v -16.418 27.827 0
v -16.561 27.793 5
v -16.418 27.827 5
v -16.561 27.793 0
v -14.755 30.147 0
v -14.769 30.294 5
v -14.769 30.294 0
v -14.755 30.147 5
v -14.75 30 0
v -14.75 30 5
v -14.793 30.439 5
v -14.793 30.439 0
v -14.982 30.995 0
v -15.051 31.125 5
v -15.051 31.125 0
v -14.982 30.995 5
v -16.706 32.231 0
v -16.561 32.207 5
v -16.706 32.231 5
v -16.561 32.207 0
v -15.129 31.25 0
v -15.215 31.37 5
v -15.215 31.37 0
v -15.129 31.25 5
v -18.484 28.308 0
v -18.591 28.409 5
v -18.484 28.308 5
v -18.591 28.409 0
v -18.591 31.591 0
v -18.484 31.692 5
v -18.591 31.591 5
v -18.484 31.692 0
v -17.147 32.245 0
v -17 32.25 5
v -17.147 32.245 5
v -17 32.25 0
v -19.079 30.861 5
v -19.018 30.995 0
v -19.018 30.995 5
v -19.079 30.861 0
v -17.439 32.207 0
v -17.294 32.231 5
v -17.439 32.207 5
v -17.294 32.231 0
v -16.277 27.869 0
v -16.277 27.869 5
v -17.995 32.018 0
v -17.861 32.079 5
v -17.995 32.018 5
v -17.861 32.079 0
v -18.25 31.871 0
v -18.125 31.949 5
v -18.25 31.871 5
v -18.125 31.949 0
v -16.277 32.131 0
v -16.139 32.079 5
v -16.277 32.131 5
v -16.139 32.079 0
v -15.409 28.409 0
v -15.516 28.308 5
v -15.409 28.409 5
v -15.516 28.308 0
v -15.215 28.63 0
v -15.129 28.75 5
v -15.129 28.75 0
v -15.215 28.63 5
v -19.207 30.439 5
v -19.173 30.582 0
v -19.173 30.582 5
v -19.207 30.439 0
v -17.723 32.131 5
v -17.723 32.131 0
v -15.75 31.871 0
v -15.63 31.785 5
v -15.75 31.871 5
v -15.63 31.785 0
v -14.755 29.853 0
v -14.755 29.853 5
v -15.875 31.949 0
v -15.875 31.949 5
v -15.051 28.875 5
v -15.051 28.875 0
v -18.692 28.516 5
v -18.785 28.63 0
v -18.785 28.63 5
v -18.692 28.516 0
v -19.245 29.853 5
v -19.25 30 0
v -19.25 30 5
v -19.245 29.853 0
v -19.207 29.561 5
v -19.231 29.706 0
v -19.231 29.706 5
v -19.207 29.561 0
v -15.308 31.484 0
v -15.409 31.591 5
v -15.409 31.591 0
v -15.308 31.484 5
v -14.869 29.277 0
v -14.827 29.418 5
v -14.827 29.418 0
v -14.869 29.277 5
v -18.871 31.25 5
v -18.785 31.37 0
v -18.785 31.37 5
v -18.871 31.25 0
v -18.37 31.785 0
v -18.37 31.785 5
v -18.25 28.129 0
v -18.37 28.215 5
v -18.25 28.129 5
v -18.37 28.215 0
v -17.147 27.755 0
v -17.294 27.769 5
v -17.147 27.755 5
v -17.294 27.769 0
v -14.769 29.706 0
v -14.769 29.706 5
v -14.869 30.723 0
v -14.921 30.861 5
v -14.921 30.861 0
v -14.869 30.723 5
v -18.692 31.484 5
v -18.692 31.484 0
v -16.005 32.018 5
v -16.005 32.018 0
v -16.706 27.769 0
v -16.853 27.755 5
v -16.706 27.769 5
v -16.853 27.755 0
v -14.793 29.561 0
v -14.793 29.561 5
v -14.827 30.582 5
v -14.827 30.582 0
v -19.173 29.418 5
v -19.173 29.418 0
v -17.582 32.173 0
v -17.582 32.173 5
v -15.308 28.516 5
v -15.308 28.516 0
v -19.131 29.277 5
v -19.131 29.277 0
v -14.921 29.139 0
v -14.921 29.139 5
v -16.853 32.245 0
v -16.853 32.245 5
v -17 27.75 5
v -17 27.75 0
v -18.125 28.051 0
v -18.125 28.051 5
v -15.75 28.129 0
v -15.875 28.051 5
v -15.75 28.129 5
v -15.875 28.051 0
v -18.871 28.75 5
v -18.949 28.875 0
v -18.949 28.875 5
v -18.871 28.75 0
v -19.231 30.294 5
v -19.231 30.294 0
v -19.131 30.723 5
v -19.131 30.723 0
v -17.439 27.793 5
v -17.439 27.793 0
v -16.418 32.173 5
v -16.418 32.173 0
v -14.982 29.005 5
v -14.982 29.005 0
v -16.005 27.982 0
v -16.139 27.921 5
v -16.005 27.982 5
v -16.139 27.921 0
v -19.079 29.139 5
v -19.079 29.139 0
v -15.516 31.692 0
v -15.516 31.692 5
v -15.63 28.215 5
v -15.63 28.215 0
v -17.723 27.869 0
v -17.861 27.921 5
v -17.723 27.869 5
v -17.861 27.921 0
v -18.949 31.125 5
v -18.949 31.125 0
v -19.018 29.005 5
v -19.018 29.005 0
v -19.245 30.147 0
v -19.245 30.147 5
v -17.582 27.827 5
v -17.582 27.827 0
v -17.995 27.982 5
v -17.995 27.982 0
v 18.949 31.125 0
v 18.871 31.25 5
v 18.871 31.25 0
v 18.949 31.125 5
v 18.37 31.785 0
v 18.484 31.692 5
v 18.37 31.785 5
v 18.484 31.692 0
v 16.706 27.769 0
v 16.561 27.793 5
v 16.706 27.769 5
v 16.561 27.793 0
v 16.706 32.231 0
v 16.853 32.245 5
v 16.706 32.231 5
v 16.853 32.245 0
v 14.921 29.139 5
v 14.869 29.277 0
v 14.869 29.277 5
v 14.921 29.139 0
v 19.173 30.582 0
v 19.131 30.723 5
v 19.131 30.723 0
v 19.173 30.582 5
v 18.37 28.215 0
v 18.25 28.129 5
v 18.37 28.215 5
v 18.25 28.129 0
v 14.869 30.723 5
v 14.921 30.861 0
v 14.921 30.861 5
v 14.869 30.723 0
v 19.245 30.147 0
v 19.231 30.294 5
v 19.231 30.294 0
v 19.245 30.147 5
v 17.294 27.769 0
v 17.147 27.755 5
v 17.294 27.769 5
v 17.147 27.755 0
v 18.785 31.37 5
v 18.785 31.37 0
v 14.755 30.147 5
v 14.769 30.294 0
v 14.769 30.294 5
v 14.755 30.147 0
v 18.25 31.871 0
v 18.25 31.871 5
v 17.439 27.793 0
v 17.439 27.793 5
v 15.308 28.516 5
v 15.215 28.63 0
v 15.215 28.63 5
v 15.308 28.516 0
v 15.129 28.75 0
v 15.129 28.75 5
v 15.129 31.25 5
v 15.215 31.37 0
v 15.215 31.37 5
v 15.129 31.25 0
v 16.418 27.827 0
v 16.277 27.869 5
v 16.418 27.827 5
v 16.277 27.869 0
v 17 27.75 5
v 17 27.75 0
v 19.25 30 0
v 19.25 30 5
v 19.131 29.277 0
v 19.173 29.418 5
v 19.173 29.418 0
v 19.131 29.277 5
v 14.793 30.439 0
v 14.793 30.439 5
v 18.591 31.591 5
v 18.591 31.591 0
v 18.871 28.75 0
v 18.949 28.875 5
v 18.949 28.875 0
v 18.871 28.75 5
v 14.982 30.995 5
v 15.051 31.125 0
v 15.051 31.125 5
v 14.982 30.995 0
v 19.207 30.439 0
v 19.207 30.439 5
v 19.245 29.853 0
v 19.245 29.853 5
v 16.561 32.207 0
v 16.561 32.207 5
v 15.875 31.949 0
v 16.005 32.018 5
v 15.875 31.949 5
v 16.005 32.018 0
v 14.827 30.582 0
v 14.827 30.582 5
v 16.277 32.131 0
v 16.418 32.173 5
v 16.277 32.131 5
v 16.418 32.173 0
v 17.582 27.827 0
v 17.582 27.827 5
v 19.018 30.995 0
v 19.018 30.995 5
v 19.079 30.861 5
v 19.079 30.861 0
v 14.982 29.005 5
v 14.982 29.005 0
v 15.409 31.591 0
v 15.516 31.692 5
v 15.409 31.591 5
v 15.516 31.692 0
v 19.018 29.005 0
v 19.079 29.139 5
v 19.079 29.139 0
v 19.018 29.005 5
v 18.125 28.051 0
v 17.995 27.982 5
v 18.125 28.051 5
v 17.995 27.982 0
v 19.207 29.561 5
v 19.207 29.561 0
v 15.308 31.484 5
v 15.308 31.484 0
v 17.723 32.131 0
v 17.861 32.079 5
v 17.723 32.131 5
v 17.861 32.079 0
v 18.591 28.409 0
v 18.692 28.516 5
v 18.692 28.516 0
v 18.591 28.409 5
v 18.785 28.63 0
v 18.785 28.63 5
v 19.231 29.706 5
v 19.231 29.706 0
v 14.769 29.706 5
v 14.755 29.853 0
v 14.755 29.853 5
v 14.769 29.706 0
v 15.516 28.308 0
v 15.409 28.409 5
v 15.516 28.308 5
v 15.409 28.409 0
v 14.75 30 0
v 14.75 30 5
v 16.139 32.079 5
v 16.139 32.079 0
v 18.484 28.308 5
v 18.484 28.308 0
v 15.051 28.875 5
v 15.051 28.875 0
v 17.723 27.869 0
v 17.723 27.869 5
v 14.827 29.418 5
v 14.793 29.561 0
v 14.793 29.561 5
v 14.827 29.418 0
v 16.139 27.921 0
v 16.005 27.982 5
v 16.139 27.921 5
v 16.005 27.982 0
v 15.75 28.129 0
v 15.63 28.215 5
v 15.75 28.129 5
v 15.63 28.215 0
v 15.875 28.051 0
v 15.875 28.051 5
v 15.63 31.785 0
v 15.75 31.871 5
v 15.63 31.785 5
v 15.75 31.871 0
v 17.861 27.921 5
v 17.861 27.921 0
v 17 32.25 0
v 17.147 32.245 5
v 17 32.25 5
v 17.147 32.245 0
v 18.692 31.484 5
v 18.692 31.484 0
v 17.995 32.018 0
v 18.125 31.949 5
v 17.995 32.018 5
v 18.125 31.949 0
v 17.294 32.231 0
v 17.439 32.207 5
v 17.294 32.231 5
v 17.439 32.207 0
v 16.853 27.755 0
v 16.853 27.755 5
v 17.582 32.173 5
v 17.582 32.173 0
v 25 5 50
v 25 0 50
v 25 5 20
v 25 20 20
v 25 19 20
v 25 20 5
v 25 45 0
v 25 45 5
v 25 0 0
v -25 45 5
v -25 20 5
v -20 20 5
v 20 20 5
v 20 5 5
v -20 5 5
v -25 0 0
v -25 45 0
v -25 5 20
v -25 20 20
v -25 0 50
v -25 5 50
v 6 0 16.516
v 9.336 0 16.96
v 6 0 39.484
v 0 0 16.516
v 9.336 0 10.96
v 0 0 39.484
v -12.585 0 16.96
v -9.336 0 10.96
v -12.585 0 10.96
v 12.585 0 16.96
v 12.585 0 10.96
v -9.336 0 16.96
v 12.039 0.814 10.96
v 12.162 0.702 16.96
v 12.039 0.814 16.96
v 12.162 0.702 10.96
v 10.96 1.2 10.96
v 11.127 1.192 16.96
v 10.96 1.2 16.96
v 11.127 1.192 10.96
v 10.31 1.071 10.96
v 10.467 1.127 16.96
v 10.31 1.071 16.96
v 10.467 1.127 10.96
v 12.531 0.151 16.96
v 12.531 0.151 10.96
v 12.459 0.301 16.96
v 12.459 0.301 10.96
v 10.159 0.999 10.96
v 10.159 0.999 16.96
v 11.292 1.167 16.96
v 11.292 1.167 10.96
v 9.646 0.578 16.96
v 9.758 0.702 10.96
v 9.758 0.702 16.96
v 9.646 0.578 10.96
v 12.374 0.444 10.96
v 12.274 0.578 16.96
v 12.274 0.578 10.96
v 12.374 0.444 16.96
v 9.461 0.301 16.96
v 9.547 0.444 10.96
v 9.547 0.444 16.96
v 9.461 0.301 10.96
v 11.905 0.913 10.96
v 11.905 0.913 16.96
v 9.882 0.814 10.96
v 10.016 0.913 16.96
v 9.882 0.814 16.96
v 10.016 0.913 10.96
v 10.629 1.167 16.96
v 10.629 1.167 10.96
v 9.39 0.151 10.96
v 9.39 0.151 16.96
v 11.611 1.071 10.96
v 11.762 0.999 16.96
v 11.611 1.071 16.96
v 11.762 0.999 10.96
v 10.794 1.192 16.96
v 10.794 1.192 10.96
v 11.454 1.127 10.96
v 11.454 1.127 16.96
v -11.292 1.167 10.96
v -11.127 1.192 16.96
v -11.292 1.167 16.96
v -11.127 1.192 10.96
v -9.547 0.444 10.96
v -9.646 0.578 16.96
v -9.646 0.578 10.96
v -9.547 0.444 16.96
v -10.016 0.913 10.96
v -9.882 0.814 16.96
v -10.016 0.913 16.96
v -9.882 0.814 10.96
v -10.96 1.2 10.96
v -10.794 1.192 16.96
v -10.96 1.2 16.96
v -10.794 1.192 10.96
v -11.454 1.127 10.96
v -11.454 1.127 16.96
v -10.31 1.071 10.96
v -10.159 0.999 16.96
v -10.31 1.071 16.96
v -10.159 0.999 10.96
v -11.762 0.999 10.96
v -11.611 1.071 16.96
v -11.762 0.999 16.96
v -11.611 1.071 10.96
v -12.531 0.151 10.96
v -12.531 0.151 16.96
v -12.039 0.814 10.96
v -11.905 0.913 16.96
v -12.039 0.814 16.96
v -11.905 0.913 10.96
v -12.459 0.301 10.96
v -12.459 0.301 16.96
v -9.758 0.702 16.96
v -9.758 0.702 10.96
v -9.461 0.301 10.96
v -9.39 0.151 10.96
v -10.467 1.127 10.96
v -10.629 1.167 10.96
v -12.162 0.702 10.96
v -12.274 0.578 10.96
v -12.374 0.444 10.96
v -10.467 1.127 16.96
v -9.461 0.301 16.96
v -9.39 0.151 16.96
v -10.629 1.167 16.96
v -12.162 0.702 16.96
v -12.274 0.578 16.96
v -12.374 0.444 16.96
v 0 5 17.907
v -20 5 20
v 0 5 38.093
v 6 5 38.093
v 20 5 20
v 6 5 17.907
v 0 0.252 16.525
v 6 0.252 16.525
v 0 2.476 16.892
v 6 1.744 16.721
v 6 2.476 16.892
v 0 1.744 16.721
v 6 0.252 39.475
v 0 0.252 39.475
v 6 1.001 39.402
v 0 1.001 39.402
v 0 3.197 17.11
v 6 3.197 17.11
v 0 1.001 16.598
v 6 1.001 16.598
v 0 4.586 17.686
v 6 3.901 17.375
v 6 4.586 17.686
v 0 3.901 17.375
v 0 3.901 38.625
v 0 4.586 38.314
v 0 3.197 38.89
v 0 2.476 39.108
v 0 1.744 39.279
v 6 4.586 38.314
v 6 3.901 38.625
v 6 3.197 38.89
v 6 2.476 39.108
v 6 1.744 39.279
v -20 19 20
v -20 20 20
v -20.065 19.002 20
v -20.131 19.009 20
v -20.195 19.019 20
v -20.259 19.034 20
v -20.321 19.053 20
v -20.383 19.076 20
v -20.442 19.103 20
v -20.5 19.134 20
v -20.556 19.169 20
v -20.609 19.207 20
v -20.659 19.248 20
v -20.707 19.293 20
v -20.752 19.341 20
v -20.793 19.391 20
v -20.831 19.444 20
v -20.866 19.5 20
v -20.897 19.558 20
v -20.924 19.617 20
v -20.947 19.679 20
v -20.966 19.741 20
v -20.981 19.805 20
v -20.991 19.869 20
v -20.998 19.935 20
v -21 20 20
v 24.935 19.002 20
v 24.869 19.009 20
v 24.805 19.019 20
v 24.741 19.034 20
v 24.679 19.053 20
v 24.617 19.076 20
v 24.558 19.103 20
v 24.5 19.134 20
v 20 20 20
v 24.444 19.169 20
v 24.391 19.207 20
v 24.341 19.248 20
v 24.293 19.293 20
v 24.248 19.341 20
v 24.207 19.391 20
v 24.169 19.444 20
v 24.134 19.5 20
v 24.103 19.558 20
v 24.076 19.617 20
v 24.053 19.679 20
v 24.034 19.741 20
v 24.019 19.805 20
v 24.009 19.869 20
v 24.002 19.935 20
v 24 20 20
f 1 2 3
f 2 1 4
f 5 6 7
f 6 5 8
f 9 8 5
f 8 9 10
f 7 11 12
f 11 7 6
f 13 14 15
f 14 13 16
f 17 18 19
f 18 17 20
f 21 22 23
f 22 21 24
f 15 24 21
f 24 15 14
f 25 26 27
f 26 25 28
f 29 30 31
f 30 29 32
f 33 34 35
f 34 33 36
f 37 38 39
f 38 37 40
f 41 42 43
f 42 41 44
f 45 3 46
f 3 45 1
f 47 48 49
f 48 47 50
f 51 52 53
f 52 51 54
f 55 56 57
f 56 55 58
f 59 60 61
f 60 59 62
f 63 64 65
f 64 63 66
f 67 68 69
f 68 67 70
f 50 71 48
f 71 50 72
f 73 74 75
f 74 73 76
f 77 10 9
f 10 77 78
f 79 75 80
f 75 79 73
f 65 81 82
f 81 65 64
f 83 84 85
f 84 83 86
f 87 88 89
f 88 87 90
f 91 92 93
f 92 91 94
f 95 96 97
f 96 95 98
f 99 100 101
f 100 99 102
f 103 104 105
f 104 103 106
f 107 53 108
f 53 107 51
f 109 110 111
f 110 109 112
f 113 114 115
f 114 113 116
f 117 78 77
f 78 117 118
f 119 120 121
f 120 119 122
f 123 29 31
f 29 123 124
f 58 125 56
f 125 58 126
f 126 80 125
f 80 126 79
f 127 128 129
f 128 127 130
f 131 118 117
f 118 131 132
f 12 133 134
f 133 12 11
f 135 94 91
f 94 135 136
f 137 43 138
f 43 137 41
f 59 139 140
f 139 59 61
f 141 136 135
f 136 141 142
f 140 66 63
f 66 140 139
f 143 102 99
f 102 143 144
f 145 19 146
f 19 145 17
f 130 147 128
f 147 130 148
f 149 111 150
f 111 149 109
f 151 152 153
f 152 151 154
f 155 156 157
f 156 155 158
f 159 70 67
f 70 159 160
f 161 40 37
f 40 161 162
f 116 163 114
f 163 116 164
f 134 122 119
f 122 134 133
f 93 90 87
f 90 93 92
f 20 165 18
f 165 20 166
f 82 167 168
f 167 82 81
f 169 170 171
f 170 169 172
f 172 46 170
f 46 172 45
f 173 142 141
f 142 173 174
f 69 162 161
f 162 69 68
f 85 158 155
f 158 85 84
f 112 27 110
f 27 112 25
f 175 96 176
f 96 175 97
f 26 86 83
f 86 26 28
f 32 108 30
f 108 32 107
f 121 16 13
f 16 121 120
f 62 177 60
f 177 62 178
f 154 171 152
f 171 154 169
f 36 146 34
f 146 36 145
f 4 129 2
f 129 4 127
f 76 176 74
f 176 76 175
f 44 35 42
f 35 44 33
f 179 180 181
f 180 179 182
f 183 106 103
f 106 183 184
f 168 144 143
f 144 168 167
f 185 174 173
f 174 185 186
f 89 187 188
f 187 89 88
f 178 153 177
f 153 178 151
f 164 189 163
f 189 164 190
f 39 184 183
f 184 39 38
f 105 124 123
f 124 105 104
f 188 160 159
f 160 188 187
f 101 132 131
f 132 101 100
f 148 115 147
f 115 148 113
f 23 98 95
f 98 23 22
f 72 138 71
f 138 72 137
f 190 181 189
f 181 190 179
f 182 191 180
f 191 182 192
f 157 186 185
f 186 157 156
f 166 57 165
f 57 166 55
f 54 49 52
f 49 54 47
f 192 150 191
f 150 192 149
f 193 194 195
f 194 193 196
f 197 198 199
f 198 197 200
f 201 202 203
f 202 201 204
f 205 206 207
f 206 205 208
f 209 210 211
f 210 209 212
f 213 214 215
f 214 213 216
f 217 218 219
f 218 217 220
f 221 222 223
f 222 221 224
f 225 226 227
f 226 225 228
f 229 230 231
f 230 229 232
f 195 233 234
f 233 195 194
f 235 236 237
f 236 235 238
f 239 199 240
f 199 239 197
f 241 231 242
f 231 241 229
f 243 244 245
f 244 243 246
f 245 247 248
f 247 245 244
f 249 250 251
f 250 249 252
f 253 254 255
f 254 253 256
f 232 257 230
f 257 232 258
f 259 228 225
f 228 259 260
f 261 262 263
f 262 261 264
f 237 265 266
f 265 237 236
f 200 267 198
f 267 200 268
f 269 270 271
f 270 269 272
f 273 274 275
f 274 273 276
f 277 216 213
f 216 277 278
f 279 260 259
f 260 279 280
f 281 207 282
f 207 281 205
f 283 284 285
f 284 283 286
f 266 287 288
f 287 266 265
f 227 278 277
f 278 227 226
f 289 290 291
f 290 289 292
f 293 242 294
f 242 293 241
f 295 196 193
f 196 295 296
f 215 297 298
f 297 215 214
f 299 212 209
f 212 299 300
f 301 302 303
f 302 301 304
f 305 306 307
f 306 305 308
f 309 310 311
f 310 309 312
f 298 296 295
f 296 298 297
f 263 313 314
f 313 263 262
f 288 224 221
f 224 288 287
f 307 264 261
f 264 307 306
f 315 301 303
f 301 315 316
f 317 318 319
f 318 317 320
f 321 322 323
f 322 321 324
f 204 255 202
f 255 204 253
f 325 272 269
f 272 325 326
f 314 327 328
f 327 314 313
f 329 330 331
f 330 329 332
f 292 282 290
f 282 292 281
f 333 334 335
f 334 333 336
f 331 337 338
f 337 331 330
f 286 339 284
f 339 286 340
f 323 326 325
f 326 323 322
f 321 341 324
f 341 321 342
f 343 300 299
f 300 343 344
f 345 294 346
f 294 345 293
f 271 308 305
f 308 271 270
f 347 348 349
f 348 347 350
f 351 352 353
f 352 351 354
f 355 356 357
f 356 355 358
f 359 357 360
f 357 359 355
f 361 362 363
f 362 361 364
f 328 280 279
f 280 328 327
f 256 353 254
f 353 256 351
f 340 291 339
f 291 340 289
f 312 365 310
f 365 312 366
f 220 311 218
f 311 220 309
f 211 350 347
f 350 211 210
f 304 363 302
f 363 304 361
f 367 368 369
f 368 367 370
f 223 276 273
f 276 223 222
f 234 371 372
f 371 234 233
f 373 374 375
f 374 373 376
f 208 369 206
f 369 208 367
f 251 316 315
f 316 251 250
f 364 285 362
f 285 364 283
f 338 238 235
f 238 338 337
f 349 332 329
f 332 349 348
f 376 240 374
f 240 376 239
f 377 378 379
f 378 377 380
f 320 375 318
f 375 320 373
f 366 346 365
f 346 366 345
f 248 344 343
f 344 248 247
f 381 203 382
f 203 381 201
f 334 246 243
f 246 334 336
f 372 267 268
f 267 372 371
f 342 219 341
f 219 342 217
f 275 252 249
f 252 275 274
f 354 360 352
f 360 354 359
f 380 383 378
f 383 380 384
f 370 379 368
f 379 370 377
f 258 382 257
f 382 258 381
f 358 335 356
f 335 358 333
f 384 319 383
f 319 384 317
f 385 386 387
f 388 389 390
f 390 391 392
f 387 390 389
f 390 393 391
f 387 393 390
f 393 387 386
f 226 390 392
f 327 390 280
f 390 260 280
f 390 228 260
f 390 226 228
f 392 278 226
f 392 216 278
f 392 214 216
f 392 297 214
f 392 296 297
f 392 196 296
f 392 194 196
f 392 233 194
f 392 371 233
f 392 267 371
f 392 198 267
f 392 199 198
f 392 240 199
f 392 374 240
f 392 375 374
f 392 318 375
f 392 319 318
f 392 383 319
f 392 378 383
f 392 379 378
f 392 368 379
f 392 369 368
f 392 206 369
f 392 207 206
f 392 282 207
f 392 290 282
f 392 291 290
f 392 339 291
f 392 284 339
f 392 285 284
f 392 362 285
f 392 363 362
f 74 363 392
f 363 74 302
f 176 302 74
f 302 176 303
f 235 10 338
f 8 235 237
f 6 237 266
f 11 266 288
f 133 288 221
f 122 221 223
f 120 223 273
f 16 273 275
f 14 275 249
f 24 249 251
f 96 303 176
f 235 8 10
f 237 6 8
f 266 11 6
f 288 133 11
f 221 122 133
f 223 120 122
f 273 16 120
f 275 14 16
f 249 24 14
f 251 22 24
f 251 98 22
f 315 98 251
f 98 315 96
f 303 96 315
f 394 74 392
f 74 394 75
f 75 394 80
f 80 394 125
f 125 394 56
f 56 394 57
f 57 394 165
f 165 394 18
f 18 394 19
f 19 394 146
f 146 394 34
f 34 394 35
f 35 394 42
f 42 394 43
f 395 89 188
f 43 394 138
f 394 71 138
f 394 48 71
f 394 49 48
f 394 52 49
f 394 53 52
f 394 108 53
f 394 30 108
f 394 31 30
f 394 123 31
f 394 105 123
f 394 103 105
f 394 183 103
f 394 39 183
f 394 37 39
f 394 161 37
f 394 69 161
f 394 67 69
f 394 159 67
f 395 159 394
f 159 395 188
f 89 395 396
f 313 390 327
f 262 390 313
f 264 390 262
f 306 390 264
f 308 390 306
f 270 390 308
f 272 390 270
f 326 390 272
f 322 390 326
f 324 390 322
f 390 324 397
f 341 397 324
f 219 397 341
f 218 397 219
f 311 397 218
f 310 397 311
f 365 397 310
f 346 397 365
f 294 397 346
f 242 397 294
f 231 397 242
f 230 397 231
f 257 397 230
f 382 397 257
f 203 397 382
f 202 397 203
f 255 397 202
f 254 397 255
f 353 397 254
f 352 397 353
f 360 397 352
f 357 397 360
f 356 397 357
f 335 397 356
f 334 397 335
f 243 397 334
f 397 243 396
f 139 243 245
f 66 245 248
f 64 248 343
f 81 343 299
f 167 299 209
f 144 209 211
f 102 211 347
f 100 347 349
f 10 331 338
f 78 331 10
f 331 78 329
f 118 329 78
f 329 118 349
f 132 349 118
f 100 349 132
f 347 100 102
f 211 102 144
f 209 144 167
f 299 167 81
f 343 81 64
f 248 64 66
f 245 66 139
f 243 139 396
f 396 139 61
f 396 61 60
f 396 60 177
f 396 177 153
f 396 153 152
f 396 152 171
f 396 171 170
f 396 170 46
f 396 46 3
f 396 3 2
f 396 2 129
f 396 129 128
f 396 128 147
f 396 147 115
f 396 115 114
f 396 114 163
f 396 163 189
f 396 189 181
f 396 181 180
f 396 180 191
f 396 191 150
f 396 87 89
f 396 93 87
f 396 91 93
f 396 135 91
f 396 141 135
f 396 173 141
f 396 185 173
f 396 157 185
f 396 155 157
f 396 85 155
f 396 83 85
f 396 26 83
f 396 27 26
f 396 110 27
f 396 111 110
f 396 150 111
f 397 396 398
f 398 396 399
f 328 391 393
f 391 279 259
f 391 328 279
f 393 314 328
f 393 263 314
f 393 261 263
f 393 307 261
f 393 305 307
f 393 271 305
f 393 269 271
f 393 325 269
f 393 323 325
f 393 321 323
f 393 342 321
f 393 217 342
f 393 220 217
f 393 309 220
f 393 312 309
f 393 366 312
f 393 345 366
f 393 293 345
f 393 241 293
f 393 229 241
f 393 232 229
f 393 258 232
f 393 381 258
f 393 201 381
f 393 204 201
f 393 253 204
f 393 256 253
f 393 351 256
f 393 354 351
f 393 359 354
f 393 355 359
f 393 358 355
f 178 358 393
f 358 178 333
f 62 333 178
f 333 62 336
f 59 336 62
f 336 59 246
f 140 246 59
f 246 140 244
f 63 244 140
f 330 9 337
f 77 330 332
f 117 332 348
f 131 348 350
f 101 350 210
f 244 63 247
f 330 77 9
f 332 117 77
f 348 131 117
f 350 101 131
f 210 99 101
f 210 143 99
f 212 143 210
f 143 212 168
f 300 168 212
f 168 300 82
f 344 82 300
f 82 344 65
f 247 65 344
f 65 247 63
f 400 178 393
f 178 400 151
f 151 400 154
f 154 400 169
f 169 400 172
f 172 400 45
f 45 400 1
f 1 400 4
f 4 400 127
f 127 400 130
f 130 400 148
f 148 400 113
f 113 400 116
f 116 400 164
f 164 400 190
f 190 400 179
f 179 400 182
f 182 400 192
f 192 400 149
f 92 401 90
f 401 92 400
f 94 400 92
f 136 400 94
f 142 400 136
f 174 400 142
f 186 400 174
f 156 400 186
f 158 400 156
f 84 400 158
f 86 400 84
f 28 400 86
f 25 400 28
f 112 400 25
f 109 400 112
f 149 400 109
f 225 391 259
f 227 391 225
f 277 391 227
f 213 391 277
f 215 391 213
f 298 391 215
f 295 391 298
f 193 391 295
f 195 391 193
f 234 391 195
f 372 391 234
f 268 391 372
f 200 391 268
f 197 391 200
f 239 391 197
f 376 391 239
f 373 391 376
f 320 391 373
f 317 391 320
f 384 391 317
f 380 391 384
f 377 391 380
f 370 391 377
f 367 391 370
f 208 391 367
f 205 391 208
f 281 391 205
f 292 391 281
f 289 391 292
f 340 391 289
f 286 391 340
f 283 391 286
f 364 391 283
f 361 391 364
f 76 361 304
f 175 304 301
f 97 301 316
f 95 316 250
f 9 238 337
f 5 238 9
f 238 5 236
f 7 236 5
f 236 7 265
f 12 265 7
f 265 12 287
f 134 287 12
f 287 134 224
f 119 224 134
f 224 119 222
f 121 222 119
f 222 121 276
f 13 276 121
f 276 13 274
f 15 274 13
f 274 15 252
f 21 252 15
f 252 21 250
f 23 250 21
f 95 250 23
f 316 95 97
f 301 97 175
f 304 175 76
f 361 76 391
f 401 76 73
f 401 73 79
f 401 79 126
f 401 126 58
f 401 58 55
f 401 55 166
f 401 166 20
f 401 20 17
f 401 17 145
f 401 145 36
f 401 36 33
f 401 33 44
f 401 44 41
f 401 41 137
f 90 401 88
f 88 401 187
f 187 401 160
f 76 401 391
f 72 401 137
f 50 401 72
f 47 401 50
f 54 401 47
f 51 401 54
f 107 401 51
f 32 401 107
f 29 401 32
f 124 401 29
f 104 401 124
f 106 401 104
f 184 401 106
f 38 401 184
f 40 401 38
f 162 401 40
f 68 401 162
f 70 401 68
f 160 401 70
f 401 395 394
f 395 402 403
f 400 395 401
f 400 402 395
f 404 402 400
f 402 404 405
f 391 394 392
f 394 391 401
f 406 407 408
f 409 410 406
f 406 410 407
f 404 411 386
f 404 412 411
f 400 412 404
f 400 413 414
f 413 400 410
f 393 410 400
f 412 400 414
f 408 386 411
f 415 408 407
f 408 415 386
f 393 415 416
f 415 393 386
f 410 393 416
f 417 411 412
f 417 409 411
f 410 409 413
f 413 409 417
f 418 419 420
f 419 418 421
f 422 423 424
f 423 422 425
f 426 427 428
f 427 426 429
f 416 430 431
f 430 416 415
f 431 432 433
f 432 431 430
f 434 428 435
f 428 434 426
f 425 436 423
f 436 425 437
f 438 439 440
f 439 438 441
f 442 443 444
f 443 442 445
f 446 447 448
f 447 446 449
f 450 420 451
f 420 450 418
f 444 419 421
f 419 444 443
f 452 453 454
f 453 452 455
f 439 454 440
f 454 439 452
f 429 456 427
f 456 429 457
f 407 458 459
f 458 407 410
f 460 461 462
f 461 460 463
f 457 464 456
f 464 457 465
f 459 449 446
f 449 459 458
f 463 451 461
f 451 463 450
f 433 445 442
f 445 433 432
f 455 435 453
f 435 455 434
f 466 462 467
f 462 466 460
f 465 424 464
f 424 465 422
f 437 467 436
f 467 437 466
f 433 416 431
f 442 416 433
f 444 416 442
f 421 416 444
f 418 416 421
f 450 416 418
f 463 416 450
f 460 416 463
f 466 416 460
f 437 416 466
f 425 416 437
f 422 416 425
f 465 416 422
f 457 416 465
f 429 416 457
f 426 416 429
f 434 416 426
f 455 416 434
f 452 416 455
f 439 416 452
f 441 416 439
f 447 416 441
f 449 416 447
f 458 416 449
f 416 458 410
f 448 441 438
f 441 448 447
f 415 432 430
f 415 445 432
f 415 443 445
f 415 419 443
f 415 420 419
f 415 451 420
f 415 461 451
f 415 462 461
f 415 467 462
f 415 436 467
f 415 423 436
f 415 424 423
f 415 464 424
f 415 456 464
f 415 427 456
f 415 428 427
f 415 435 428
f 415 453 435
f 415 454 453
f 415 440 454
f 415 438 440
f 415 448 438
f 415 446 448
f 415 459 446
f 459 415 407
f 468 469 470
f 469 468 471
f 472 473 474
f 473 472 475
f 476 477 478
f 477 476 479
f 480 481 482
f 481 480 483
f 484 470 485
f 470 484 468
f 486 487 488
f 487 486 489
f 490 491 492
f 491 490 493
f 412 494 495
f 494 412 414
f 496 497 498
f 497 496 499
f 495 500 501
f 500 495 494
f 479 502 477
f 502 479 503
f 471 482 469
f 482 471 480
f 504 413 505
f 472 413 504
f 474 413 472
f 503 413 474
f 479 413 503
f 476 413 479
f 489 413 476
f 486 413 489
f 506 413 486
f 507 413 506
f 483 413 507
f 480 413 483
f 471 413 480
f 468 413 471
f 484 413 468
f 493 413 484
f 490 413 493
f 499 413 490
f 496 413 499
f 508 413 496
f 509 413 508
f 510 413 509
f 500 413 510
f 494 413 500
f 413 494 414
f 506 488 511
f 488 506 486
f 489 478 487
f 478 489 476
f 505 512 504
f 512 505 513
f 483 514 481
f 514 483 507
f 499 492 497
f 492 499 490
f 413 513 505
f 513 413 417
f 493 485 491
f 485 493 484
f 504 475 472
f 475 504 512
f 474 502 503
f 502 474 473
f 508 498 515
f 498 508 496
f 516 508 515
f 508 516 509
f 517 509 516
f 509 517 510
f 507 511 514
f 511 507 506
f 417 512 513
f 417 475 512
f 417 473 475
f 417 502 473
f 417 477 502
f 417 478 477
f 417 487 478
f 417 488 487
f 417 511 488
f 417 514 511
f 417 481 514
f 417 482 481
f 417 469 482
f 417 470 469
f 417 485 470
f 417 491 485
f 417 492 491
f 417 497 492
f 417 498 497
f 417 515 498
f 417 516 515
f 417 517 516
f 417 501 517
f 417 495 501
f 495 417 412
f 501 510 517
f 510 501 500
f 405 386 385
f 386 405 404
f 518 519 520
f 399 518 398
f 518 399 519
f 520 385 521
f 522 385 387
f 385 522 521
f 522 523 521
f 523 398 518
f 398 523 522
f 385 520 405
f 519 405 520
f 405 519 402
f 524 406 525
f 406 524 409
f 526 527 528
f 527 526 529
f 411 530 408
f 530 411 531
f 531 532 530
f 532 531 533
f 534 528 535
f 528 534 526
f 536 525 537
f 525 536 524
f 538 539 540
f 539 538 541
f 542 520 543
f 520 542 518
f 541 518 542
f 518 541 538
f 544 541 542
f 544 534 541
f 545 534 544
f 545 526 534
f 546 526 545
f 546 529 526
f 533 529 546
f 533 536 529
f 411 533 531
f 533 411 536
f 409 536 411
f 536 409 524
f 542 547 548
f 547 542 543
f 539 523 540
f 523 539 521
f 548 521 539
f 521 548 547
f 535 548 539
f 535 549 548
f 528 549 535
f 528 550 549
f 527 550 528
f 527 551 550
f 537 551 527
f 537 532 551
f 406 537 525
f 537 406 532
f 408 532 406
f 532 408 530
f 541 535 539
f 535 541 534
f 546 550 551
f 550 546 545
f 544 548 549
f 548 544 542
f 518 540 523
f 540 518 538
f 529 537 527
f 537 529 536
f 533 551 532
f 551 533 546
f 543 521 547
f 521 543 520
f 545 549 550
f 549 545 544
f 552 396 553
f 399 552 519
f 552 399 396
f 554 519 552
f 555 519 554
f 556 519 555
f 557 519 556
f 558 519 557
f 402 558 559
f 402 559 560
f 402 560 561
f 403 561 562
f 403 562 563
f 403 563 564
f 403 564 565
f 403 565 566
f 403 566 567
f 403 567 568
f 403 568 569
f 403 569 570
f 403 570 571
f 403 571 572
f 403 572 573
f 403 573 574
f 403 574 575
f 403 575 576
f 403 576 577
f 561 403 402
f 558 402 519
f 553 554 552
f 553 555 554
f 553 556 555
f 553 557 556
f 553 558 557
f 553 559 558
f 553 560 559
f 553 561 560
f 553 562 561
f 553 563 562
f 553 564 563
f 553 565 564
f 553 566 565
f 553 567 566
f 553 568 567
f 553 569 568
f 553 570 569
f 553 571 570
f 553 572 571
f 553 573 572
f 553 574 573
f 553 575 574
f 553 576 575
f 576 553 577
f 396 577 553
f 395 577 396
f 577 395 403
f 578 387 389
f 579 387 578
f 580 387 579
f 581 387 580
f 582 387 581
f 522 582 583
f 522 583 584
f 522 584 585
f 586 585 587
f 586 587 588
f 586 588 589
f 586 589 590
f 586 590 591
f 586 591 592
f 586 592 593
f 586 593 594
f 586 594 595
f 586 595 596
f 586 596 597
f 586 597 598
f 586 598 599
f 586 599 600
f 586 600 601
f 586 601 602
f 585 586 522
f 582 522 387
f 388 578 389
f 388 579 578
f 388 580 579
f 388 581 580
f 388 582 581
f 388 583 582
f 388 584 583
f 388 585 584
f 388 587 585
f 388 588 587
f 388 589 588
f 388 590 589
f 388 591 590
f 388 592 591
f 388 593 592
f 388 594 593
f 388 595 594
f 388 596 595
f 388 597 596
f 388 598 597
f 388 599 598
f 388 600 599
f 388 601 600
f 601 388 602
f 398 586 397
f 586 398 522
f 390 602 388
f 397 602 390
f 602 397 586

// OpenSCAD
// L-shaped mounting bracket for NEMA 17 stepper motor (syringe pump)
// Print orientation: base plate on bed, vertical motor plate builds up +Z

// ---------------- Parameters ----------------
base_x0      = -25;   // base plate x start
base_x1      = 25;    // base plate x end
base_y0      = 0;     // base plate y start
base_y1      = 45;    // base plate y end
base_z       = 5;     // base plate thickness

motor_x0     = -25;   // motor plate x start
motor_x1     = 25;    // motor plate x end
motor_y      = 5;     // motor plate thickness (y end)
motor_z      = 50;    // motor plate height (z end)

boss_d       = 23;    // motor centring boss hole diameter
boss_x       = 0;     // boss hole centre x
boss_z       = 28;    // boss hole centre z

screw_d      = 3.4;   // M3 screw hole diameter
screw_n      = 4;     // number of screw holes
screw_pitch  = 31;    // square pattern side length

gusset_t     = 5;     // gusset thickness (x direction)
gusset_leg   = 20;    // right triangle legs along +Y and +Z
gusset_x0    = -25;   // left gusset x start
gusset_x1    = -20;   // left gusset x end
gusset_x2    = 20;    // right gusset x start
gusset_x3    = 25;    // right gusset x end

eps          = 0.5;   // cutter overshoot past faces

$fn = 96;

// ---------------- Model ----------------
union() {
    // Base plate with M4 through-holes
    difference() {
        translate([base_x0, base_y0, 0])
            cube([base_x1 - base_x0, base_y1 - base_y0, base_z]);
        for (sx = [-17, 17])
            translate([sx, base_y1 - 15, -eps])
                cylinder(d = 4.5, h = base_z + 2 * eps);
    }

    // Vertical motor plate with boss hole and M3 screw holes
    difference() {
        translate([motor_x0, 0, 0])
            cube([motor_x1 - motor_x0, motor_y, motor_z]);
        translate([boss_x, -eps, boss_z])
            rotate([0, 90, 0])
                cylinder(d = boss_d, h = motor_y + 2 * eps);
        for (i = [0 : screw_n - 1]) {
            a = screw_pitch / 2;
            x = a * cos(45 + i * 90);
            z = a * sin(45 + i * 90);
            translate([x, -eps, z])
                cylinder(d = screw_d, h = motor_y + 2 * eps, $fn = 64);
        }
    }

    // Gussets, flush with left and right edges
    for (sx = [gusset_x0, gusset_x2])
        translate([sx, 0, 0])
            difference() {
                translate([0, 0, 0])
                    cube([gusset_t, gusset_leg, gusset_leg]);
                // round the acute corner at y = gusset_leg, z = gusset_leg
                translate([gusset_t, gusset_leg, gusset_leg])
                    cylinder(r = 1, h = 1 + eps);
            }
}
